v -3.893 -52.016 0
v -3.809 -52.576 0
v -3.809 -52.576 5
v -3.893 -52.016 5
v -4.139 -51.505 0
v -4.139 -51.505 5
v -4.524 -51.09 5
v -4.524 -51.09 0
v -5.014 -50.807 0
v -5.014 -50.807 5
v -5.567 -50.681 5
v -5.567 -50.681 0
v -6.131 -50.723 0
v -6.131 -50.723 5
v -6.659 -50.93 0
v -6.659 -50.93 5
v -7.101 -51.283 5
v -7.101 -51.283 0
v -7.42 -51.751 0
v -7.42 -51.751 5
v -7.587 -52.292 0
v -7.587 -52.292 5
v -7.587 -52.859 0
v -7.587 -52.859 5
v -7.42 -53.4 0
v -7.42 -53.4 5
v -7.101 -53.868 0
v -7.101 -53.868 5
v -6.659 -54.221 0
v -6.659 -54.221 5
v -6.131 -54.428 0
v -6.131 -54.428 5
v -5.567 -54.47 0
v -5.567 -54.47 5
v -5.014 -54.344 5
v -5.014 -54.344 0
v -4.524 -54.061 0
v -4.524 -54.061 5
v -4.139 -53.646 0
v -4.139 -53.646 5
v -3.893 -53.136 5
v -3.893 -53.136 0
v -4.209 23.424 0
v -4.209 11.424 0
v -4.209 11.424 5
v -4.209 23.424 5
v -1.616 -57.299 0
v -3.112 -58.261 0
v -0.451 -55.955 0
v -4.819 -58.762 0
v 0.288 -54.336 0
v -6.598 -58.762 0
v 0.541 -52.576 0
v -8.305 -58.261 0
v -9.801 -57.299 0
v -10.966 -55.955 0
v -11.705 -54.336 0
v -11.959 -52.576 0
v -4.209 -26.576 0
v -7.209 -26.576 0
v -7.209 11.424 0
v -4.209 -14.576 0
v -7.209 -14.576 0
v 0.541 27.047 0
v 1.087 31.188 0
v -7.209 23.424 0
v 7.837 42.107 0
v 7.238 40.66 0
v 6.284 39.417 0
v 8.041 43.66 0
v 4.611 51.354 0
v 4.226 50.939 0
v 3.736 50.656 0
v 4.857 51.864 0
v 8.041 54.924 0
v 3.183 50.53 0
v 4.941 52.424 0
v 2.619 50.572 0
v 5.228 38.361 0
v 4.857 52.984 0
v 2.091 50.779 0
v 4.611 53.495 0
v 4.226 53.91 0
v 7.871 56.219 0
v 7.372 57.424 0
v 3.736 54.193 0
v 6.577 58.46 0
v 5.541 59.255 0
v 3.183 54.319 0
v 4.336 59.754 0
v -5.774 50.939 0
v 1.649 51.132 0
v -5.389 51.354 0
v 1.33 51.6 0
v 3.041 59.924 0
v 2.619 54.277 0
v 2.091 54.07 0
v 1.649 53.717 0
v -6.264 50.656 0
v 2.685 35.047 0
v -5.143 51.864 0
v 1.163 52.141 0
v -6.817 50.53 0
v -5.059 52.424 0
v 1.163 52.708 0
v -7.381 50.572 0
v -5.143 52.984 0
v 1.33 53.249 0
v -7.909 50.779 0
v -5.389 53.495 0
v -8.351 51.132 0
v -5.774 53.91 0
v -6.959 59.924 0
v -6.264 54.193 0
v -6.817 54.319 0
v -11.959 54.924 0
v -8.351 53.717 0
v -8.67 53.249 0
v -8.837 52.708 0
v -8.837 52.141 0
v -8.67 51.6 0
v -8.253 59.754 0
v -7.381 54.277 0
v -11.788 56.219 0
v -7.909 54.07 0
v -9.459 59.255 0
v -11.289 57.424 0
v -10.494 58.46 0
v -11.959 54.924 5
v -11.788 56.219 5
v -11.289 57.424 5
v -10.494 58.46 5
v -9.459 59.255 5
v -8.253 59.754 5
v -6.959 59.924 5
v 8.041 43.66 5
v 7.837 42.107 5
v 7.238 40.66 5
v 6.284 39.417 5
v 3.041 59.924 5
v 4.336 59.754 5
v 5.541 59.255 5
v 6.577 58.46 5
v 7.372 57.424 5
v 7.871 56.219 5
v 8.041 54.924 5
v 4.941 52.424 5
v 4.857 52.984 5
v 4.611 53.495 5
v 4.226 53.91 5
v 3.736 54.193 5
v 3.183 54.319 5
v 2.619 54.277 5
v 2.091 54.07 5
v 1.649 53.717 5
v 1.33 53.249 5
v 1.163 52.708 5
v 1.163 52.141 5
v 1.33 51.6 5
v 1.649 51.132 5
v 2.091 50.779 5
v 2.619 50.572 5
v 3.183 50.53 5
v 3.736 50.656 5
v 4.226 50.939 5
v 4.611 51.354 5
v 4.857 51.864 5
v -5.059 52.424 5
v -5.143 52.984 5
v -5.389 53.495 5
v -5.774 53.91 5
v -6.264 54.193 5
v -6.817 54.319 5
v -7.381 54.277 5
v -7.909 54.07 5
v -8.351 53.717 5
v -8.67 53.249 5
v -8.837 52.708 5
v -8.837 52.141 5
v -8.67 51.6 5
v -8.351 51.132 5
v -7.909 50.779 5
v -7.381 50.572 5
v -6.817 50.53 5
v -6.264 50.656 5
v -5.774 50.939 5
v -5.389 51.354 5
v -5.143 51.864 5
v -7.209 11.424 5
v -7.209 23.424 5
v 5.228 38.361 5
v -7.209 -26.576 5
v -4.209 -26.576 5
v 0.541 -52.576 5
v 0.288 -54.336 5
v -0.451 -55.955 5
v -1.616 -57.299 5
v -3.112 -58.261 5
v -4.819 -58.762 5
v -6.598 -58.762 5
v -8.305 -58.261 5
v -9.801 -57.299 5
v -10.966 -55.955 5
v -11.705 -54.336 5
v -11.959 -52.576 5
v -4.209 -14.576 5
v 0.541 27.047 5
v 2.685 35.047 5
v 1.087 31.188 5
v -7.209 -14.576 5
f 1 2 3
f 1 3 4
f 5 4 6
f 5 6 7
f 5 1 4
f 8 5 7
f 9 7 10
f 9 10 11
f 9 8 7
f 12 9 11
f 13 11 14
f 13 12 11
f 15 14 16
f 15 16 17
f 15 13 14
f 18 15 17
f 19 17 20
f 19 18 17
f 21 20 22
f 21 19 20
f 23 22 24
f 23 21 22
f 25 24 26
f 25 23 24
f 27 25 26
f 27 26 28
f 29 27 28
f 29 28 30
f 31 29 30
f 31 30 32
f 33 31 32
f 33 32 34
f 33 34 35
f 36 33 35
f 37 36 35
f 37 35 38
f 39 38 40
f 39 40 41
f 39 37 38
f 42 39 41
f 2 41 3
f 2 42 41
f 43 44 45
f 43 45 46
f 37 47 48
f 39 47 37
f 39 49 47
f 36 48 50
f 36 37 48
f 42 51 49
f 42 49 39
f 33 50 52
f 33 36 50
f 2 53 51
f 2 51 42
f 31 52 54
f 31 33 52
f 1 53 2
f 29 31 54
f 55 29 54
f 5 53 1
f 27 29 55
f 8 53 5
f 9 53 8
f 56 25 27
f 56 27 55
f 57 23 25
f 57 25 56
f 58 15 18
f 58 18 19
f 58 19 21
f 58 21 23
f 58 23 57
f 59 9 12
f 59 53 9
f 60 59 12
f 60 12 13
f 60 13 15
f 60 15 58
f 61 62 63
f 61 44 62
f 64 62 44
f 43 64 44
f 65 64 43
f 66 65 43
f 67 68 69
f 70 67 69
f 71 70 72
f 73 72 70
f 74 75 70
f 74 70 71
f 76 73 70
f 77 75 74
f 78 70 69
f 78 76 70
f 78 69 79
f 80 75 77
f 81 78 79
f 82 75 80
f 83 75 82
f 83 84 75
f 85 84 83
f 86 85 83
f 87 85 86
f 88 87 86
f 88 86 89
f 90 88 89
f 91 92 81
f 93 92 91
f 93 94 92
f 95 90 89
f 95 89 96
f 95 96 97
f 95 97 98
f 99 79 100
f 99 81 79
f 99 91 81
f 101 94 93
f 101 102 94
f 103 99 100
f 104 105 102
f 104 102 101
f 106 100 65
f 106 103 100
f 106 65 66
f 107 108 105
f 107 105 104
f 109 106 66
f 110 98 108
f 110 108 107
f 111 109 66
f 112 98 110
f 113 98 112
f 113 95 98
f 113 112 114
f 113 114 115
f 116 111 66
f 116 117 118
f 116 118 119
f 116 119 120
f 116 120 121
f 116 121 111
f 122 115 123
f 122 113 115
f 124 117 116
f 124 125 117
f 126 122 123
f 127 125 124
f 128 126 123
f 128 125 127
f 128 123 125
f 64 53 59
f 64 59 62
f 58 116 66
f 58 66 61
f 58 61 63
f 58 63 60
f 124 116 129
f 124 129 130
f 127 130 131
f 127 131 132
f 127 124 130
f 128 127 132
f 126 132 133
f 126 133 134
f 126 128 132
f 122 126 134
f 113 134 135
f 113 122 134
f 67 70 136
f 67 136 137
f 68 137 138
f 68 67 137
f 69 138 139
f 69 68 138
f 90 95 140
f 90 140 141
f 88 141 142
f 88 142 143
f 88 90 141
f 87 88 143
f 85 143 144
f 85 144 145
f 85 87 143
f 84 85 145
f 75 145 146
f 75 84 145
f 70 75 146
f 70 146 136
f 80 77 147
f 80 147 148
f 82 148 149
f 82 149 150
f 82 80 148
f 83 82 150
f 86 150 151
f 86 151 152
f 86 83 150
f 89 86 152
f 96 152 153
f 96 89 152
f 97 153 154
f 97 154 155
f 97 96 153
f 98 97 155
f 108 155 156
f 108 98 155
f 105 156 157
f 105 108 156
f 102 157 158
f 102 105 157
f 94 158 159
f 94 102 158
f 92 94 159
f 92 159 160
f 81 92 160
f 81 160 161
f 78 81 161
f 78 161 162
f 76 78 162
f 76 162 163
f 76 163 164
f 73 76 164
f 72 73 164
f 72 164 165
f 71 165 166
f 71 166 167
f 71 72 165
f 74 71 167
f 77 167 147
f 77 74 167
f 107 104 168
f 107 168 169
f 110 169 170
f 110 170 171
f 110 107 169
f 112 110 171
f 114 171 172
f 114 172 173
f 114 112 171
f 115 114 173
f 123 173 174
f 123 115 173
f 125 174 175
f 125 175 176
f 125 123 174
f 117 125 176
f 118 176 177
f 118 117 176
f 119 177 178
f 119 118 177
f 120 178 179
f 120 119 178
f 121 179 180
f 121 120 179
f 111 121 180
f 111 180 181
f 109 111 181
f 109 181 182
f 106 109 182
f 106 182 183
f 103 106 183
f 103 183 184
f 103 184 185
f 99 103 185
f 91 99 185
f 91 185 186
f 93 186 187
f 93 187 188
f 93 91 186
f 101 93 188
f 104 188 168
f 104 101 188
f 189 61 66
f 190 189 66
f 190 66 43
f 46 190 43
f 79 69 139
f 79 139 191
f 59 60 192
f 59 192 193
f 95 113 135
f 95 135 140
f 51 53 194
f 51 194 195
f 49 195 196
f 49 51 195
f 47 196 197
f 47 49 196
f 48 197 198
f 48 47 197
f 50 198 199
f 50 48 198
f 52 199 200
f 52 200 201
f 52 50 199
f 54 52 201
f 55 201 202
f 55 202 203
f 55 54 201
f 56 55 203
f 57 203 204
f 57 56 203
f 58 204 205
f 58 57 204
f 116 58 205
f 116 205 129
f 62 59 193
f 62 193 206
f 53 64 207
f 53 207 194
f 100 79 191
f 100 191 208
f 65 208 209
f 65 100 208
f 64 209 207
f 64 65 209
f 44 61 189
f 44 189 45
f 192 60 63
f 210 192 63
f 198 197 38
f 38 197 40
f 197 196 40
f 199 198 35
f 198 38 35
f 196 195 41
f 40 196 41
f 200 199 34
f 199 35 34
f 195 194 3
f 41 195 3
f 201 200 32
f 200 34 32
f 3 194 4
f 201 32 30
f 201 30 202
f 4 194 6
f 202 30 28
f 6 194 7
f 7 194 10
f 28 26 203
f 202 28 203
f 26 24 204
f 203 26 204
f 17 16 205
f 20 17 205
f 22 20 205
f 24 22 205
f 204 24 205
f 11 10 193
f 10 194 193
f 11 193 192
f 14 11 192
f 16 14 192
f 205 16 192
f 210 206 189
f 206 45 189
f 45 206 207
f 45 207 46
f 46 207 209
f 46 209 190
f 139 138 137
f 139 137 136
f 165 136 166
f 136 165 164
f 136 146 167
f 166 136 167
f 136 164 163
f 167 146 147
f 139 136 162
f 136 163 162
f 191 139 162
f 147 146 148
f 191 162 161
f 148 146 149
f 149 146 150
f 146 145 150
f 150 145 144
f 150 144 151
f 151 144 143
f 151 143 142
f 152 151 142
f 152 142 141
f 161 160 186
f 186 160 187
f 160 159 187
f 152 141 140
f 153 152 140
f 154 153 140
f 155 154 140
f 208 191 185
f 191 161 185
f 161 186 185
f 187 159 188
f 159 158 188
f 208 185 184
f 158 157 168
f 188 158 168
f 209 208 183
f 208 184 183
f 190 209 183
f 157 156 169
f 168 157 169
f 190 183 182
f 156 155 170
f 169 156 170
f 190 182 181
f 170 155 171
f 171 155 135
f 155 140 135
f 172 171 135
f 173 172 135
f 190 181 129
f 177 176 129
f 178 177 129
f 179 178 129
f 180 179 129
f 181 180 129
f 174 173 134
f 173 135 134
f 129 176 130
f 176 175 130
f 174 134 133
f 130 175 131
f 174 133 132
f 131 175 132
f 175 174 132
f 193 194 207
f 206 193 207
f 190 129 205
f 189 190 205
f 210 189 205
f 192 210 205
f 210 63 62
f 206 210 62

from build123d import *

# Parameters (mm, degrees)
ESQUISSE1_R        = 1.9
ESQUISSE1_W        = 3
ESQUISSE1_H        = 12
BOSS_EXTRU_1_DEPTH = 5


with BuildPart() as part:
    # Esquisse1 → Boss.-Extru.1 (new body)
    with BuildSketch(Plane.XY):
        with BuildLine():
            Line((-6.95859236, 59.924430221), (3.04140764, 59.924430221))
            ThreePointArc((3.04140764, 59.924430221), (6.576941546, 58.459964127), (8.04140764, 54.924430221))
            Line((8.04140764, 54.924430221), (8.04140764, 43.659711595))
            ThreePointArc((8.04140764, 43.659711595), (7.584684835, 41.363611001), (6.284048327, 39.417070908))
            Line((6.284048327, 39.417070908), (5.227699141, 38.360721722))
            ThreePointArc((5.227699141, 38.360721722), (1.75933512, 33.169948141), (0.54140764, 27.047013223))
            Line((0.54140764, 27.047013223), (0.54140764, -52.575569779))
            ThreePointArc((0.54140764, -52.575569779), (-5.70859236, -58.825569779), (-11.95859236, -52.575569779))
            Line((-11.95859236, -52.575569779), (-11.95859236, 54.924430221))
            ThreePointArc((-11.95859236, 54.924430221), (-10.494126266, 58.459964127), (-6.95859236, 59.924430221))
        make_face()
        with Locations((-5.70859236, -52.575569779)):
            Circle(ESQUISSE1_R, mode=Mode.SUBTRACT)
        with Locations((3.04140764, 52.424430221)):
            Circle(ESQUISSE1_R, mode=Mode.SUBTRACT)
        with Locations((-6.95859236, 52.424430221)):
            Circle(ESQUISSE1_R, mode=Mode.SUBTRACT)
        with Locations((-5.70859236, 17.424430221)):
            Rectangle(ESQUISSE1_W, ESQUISSE1_H, mode=Mode.SUBTRACT)
        with Locations((-5.70859236, -20.575569779)):
            Rectangle(ESQUISSE1_W, ESQUISSE1_H, mode=Mode.SUBTRACT)
    extrude(amount=BOSS_EXTRU_1_DEPTH)


solid = part.part
